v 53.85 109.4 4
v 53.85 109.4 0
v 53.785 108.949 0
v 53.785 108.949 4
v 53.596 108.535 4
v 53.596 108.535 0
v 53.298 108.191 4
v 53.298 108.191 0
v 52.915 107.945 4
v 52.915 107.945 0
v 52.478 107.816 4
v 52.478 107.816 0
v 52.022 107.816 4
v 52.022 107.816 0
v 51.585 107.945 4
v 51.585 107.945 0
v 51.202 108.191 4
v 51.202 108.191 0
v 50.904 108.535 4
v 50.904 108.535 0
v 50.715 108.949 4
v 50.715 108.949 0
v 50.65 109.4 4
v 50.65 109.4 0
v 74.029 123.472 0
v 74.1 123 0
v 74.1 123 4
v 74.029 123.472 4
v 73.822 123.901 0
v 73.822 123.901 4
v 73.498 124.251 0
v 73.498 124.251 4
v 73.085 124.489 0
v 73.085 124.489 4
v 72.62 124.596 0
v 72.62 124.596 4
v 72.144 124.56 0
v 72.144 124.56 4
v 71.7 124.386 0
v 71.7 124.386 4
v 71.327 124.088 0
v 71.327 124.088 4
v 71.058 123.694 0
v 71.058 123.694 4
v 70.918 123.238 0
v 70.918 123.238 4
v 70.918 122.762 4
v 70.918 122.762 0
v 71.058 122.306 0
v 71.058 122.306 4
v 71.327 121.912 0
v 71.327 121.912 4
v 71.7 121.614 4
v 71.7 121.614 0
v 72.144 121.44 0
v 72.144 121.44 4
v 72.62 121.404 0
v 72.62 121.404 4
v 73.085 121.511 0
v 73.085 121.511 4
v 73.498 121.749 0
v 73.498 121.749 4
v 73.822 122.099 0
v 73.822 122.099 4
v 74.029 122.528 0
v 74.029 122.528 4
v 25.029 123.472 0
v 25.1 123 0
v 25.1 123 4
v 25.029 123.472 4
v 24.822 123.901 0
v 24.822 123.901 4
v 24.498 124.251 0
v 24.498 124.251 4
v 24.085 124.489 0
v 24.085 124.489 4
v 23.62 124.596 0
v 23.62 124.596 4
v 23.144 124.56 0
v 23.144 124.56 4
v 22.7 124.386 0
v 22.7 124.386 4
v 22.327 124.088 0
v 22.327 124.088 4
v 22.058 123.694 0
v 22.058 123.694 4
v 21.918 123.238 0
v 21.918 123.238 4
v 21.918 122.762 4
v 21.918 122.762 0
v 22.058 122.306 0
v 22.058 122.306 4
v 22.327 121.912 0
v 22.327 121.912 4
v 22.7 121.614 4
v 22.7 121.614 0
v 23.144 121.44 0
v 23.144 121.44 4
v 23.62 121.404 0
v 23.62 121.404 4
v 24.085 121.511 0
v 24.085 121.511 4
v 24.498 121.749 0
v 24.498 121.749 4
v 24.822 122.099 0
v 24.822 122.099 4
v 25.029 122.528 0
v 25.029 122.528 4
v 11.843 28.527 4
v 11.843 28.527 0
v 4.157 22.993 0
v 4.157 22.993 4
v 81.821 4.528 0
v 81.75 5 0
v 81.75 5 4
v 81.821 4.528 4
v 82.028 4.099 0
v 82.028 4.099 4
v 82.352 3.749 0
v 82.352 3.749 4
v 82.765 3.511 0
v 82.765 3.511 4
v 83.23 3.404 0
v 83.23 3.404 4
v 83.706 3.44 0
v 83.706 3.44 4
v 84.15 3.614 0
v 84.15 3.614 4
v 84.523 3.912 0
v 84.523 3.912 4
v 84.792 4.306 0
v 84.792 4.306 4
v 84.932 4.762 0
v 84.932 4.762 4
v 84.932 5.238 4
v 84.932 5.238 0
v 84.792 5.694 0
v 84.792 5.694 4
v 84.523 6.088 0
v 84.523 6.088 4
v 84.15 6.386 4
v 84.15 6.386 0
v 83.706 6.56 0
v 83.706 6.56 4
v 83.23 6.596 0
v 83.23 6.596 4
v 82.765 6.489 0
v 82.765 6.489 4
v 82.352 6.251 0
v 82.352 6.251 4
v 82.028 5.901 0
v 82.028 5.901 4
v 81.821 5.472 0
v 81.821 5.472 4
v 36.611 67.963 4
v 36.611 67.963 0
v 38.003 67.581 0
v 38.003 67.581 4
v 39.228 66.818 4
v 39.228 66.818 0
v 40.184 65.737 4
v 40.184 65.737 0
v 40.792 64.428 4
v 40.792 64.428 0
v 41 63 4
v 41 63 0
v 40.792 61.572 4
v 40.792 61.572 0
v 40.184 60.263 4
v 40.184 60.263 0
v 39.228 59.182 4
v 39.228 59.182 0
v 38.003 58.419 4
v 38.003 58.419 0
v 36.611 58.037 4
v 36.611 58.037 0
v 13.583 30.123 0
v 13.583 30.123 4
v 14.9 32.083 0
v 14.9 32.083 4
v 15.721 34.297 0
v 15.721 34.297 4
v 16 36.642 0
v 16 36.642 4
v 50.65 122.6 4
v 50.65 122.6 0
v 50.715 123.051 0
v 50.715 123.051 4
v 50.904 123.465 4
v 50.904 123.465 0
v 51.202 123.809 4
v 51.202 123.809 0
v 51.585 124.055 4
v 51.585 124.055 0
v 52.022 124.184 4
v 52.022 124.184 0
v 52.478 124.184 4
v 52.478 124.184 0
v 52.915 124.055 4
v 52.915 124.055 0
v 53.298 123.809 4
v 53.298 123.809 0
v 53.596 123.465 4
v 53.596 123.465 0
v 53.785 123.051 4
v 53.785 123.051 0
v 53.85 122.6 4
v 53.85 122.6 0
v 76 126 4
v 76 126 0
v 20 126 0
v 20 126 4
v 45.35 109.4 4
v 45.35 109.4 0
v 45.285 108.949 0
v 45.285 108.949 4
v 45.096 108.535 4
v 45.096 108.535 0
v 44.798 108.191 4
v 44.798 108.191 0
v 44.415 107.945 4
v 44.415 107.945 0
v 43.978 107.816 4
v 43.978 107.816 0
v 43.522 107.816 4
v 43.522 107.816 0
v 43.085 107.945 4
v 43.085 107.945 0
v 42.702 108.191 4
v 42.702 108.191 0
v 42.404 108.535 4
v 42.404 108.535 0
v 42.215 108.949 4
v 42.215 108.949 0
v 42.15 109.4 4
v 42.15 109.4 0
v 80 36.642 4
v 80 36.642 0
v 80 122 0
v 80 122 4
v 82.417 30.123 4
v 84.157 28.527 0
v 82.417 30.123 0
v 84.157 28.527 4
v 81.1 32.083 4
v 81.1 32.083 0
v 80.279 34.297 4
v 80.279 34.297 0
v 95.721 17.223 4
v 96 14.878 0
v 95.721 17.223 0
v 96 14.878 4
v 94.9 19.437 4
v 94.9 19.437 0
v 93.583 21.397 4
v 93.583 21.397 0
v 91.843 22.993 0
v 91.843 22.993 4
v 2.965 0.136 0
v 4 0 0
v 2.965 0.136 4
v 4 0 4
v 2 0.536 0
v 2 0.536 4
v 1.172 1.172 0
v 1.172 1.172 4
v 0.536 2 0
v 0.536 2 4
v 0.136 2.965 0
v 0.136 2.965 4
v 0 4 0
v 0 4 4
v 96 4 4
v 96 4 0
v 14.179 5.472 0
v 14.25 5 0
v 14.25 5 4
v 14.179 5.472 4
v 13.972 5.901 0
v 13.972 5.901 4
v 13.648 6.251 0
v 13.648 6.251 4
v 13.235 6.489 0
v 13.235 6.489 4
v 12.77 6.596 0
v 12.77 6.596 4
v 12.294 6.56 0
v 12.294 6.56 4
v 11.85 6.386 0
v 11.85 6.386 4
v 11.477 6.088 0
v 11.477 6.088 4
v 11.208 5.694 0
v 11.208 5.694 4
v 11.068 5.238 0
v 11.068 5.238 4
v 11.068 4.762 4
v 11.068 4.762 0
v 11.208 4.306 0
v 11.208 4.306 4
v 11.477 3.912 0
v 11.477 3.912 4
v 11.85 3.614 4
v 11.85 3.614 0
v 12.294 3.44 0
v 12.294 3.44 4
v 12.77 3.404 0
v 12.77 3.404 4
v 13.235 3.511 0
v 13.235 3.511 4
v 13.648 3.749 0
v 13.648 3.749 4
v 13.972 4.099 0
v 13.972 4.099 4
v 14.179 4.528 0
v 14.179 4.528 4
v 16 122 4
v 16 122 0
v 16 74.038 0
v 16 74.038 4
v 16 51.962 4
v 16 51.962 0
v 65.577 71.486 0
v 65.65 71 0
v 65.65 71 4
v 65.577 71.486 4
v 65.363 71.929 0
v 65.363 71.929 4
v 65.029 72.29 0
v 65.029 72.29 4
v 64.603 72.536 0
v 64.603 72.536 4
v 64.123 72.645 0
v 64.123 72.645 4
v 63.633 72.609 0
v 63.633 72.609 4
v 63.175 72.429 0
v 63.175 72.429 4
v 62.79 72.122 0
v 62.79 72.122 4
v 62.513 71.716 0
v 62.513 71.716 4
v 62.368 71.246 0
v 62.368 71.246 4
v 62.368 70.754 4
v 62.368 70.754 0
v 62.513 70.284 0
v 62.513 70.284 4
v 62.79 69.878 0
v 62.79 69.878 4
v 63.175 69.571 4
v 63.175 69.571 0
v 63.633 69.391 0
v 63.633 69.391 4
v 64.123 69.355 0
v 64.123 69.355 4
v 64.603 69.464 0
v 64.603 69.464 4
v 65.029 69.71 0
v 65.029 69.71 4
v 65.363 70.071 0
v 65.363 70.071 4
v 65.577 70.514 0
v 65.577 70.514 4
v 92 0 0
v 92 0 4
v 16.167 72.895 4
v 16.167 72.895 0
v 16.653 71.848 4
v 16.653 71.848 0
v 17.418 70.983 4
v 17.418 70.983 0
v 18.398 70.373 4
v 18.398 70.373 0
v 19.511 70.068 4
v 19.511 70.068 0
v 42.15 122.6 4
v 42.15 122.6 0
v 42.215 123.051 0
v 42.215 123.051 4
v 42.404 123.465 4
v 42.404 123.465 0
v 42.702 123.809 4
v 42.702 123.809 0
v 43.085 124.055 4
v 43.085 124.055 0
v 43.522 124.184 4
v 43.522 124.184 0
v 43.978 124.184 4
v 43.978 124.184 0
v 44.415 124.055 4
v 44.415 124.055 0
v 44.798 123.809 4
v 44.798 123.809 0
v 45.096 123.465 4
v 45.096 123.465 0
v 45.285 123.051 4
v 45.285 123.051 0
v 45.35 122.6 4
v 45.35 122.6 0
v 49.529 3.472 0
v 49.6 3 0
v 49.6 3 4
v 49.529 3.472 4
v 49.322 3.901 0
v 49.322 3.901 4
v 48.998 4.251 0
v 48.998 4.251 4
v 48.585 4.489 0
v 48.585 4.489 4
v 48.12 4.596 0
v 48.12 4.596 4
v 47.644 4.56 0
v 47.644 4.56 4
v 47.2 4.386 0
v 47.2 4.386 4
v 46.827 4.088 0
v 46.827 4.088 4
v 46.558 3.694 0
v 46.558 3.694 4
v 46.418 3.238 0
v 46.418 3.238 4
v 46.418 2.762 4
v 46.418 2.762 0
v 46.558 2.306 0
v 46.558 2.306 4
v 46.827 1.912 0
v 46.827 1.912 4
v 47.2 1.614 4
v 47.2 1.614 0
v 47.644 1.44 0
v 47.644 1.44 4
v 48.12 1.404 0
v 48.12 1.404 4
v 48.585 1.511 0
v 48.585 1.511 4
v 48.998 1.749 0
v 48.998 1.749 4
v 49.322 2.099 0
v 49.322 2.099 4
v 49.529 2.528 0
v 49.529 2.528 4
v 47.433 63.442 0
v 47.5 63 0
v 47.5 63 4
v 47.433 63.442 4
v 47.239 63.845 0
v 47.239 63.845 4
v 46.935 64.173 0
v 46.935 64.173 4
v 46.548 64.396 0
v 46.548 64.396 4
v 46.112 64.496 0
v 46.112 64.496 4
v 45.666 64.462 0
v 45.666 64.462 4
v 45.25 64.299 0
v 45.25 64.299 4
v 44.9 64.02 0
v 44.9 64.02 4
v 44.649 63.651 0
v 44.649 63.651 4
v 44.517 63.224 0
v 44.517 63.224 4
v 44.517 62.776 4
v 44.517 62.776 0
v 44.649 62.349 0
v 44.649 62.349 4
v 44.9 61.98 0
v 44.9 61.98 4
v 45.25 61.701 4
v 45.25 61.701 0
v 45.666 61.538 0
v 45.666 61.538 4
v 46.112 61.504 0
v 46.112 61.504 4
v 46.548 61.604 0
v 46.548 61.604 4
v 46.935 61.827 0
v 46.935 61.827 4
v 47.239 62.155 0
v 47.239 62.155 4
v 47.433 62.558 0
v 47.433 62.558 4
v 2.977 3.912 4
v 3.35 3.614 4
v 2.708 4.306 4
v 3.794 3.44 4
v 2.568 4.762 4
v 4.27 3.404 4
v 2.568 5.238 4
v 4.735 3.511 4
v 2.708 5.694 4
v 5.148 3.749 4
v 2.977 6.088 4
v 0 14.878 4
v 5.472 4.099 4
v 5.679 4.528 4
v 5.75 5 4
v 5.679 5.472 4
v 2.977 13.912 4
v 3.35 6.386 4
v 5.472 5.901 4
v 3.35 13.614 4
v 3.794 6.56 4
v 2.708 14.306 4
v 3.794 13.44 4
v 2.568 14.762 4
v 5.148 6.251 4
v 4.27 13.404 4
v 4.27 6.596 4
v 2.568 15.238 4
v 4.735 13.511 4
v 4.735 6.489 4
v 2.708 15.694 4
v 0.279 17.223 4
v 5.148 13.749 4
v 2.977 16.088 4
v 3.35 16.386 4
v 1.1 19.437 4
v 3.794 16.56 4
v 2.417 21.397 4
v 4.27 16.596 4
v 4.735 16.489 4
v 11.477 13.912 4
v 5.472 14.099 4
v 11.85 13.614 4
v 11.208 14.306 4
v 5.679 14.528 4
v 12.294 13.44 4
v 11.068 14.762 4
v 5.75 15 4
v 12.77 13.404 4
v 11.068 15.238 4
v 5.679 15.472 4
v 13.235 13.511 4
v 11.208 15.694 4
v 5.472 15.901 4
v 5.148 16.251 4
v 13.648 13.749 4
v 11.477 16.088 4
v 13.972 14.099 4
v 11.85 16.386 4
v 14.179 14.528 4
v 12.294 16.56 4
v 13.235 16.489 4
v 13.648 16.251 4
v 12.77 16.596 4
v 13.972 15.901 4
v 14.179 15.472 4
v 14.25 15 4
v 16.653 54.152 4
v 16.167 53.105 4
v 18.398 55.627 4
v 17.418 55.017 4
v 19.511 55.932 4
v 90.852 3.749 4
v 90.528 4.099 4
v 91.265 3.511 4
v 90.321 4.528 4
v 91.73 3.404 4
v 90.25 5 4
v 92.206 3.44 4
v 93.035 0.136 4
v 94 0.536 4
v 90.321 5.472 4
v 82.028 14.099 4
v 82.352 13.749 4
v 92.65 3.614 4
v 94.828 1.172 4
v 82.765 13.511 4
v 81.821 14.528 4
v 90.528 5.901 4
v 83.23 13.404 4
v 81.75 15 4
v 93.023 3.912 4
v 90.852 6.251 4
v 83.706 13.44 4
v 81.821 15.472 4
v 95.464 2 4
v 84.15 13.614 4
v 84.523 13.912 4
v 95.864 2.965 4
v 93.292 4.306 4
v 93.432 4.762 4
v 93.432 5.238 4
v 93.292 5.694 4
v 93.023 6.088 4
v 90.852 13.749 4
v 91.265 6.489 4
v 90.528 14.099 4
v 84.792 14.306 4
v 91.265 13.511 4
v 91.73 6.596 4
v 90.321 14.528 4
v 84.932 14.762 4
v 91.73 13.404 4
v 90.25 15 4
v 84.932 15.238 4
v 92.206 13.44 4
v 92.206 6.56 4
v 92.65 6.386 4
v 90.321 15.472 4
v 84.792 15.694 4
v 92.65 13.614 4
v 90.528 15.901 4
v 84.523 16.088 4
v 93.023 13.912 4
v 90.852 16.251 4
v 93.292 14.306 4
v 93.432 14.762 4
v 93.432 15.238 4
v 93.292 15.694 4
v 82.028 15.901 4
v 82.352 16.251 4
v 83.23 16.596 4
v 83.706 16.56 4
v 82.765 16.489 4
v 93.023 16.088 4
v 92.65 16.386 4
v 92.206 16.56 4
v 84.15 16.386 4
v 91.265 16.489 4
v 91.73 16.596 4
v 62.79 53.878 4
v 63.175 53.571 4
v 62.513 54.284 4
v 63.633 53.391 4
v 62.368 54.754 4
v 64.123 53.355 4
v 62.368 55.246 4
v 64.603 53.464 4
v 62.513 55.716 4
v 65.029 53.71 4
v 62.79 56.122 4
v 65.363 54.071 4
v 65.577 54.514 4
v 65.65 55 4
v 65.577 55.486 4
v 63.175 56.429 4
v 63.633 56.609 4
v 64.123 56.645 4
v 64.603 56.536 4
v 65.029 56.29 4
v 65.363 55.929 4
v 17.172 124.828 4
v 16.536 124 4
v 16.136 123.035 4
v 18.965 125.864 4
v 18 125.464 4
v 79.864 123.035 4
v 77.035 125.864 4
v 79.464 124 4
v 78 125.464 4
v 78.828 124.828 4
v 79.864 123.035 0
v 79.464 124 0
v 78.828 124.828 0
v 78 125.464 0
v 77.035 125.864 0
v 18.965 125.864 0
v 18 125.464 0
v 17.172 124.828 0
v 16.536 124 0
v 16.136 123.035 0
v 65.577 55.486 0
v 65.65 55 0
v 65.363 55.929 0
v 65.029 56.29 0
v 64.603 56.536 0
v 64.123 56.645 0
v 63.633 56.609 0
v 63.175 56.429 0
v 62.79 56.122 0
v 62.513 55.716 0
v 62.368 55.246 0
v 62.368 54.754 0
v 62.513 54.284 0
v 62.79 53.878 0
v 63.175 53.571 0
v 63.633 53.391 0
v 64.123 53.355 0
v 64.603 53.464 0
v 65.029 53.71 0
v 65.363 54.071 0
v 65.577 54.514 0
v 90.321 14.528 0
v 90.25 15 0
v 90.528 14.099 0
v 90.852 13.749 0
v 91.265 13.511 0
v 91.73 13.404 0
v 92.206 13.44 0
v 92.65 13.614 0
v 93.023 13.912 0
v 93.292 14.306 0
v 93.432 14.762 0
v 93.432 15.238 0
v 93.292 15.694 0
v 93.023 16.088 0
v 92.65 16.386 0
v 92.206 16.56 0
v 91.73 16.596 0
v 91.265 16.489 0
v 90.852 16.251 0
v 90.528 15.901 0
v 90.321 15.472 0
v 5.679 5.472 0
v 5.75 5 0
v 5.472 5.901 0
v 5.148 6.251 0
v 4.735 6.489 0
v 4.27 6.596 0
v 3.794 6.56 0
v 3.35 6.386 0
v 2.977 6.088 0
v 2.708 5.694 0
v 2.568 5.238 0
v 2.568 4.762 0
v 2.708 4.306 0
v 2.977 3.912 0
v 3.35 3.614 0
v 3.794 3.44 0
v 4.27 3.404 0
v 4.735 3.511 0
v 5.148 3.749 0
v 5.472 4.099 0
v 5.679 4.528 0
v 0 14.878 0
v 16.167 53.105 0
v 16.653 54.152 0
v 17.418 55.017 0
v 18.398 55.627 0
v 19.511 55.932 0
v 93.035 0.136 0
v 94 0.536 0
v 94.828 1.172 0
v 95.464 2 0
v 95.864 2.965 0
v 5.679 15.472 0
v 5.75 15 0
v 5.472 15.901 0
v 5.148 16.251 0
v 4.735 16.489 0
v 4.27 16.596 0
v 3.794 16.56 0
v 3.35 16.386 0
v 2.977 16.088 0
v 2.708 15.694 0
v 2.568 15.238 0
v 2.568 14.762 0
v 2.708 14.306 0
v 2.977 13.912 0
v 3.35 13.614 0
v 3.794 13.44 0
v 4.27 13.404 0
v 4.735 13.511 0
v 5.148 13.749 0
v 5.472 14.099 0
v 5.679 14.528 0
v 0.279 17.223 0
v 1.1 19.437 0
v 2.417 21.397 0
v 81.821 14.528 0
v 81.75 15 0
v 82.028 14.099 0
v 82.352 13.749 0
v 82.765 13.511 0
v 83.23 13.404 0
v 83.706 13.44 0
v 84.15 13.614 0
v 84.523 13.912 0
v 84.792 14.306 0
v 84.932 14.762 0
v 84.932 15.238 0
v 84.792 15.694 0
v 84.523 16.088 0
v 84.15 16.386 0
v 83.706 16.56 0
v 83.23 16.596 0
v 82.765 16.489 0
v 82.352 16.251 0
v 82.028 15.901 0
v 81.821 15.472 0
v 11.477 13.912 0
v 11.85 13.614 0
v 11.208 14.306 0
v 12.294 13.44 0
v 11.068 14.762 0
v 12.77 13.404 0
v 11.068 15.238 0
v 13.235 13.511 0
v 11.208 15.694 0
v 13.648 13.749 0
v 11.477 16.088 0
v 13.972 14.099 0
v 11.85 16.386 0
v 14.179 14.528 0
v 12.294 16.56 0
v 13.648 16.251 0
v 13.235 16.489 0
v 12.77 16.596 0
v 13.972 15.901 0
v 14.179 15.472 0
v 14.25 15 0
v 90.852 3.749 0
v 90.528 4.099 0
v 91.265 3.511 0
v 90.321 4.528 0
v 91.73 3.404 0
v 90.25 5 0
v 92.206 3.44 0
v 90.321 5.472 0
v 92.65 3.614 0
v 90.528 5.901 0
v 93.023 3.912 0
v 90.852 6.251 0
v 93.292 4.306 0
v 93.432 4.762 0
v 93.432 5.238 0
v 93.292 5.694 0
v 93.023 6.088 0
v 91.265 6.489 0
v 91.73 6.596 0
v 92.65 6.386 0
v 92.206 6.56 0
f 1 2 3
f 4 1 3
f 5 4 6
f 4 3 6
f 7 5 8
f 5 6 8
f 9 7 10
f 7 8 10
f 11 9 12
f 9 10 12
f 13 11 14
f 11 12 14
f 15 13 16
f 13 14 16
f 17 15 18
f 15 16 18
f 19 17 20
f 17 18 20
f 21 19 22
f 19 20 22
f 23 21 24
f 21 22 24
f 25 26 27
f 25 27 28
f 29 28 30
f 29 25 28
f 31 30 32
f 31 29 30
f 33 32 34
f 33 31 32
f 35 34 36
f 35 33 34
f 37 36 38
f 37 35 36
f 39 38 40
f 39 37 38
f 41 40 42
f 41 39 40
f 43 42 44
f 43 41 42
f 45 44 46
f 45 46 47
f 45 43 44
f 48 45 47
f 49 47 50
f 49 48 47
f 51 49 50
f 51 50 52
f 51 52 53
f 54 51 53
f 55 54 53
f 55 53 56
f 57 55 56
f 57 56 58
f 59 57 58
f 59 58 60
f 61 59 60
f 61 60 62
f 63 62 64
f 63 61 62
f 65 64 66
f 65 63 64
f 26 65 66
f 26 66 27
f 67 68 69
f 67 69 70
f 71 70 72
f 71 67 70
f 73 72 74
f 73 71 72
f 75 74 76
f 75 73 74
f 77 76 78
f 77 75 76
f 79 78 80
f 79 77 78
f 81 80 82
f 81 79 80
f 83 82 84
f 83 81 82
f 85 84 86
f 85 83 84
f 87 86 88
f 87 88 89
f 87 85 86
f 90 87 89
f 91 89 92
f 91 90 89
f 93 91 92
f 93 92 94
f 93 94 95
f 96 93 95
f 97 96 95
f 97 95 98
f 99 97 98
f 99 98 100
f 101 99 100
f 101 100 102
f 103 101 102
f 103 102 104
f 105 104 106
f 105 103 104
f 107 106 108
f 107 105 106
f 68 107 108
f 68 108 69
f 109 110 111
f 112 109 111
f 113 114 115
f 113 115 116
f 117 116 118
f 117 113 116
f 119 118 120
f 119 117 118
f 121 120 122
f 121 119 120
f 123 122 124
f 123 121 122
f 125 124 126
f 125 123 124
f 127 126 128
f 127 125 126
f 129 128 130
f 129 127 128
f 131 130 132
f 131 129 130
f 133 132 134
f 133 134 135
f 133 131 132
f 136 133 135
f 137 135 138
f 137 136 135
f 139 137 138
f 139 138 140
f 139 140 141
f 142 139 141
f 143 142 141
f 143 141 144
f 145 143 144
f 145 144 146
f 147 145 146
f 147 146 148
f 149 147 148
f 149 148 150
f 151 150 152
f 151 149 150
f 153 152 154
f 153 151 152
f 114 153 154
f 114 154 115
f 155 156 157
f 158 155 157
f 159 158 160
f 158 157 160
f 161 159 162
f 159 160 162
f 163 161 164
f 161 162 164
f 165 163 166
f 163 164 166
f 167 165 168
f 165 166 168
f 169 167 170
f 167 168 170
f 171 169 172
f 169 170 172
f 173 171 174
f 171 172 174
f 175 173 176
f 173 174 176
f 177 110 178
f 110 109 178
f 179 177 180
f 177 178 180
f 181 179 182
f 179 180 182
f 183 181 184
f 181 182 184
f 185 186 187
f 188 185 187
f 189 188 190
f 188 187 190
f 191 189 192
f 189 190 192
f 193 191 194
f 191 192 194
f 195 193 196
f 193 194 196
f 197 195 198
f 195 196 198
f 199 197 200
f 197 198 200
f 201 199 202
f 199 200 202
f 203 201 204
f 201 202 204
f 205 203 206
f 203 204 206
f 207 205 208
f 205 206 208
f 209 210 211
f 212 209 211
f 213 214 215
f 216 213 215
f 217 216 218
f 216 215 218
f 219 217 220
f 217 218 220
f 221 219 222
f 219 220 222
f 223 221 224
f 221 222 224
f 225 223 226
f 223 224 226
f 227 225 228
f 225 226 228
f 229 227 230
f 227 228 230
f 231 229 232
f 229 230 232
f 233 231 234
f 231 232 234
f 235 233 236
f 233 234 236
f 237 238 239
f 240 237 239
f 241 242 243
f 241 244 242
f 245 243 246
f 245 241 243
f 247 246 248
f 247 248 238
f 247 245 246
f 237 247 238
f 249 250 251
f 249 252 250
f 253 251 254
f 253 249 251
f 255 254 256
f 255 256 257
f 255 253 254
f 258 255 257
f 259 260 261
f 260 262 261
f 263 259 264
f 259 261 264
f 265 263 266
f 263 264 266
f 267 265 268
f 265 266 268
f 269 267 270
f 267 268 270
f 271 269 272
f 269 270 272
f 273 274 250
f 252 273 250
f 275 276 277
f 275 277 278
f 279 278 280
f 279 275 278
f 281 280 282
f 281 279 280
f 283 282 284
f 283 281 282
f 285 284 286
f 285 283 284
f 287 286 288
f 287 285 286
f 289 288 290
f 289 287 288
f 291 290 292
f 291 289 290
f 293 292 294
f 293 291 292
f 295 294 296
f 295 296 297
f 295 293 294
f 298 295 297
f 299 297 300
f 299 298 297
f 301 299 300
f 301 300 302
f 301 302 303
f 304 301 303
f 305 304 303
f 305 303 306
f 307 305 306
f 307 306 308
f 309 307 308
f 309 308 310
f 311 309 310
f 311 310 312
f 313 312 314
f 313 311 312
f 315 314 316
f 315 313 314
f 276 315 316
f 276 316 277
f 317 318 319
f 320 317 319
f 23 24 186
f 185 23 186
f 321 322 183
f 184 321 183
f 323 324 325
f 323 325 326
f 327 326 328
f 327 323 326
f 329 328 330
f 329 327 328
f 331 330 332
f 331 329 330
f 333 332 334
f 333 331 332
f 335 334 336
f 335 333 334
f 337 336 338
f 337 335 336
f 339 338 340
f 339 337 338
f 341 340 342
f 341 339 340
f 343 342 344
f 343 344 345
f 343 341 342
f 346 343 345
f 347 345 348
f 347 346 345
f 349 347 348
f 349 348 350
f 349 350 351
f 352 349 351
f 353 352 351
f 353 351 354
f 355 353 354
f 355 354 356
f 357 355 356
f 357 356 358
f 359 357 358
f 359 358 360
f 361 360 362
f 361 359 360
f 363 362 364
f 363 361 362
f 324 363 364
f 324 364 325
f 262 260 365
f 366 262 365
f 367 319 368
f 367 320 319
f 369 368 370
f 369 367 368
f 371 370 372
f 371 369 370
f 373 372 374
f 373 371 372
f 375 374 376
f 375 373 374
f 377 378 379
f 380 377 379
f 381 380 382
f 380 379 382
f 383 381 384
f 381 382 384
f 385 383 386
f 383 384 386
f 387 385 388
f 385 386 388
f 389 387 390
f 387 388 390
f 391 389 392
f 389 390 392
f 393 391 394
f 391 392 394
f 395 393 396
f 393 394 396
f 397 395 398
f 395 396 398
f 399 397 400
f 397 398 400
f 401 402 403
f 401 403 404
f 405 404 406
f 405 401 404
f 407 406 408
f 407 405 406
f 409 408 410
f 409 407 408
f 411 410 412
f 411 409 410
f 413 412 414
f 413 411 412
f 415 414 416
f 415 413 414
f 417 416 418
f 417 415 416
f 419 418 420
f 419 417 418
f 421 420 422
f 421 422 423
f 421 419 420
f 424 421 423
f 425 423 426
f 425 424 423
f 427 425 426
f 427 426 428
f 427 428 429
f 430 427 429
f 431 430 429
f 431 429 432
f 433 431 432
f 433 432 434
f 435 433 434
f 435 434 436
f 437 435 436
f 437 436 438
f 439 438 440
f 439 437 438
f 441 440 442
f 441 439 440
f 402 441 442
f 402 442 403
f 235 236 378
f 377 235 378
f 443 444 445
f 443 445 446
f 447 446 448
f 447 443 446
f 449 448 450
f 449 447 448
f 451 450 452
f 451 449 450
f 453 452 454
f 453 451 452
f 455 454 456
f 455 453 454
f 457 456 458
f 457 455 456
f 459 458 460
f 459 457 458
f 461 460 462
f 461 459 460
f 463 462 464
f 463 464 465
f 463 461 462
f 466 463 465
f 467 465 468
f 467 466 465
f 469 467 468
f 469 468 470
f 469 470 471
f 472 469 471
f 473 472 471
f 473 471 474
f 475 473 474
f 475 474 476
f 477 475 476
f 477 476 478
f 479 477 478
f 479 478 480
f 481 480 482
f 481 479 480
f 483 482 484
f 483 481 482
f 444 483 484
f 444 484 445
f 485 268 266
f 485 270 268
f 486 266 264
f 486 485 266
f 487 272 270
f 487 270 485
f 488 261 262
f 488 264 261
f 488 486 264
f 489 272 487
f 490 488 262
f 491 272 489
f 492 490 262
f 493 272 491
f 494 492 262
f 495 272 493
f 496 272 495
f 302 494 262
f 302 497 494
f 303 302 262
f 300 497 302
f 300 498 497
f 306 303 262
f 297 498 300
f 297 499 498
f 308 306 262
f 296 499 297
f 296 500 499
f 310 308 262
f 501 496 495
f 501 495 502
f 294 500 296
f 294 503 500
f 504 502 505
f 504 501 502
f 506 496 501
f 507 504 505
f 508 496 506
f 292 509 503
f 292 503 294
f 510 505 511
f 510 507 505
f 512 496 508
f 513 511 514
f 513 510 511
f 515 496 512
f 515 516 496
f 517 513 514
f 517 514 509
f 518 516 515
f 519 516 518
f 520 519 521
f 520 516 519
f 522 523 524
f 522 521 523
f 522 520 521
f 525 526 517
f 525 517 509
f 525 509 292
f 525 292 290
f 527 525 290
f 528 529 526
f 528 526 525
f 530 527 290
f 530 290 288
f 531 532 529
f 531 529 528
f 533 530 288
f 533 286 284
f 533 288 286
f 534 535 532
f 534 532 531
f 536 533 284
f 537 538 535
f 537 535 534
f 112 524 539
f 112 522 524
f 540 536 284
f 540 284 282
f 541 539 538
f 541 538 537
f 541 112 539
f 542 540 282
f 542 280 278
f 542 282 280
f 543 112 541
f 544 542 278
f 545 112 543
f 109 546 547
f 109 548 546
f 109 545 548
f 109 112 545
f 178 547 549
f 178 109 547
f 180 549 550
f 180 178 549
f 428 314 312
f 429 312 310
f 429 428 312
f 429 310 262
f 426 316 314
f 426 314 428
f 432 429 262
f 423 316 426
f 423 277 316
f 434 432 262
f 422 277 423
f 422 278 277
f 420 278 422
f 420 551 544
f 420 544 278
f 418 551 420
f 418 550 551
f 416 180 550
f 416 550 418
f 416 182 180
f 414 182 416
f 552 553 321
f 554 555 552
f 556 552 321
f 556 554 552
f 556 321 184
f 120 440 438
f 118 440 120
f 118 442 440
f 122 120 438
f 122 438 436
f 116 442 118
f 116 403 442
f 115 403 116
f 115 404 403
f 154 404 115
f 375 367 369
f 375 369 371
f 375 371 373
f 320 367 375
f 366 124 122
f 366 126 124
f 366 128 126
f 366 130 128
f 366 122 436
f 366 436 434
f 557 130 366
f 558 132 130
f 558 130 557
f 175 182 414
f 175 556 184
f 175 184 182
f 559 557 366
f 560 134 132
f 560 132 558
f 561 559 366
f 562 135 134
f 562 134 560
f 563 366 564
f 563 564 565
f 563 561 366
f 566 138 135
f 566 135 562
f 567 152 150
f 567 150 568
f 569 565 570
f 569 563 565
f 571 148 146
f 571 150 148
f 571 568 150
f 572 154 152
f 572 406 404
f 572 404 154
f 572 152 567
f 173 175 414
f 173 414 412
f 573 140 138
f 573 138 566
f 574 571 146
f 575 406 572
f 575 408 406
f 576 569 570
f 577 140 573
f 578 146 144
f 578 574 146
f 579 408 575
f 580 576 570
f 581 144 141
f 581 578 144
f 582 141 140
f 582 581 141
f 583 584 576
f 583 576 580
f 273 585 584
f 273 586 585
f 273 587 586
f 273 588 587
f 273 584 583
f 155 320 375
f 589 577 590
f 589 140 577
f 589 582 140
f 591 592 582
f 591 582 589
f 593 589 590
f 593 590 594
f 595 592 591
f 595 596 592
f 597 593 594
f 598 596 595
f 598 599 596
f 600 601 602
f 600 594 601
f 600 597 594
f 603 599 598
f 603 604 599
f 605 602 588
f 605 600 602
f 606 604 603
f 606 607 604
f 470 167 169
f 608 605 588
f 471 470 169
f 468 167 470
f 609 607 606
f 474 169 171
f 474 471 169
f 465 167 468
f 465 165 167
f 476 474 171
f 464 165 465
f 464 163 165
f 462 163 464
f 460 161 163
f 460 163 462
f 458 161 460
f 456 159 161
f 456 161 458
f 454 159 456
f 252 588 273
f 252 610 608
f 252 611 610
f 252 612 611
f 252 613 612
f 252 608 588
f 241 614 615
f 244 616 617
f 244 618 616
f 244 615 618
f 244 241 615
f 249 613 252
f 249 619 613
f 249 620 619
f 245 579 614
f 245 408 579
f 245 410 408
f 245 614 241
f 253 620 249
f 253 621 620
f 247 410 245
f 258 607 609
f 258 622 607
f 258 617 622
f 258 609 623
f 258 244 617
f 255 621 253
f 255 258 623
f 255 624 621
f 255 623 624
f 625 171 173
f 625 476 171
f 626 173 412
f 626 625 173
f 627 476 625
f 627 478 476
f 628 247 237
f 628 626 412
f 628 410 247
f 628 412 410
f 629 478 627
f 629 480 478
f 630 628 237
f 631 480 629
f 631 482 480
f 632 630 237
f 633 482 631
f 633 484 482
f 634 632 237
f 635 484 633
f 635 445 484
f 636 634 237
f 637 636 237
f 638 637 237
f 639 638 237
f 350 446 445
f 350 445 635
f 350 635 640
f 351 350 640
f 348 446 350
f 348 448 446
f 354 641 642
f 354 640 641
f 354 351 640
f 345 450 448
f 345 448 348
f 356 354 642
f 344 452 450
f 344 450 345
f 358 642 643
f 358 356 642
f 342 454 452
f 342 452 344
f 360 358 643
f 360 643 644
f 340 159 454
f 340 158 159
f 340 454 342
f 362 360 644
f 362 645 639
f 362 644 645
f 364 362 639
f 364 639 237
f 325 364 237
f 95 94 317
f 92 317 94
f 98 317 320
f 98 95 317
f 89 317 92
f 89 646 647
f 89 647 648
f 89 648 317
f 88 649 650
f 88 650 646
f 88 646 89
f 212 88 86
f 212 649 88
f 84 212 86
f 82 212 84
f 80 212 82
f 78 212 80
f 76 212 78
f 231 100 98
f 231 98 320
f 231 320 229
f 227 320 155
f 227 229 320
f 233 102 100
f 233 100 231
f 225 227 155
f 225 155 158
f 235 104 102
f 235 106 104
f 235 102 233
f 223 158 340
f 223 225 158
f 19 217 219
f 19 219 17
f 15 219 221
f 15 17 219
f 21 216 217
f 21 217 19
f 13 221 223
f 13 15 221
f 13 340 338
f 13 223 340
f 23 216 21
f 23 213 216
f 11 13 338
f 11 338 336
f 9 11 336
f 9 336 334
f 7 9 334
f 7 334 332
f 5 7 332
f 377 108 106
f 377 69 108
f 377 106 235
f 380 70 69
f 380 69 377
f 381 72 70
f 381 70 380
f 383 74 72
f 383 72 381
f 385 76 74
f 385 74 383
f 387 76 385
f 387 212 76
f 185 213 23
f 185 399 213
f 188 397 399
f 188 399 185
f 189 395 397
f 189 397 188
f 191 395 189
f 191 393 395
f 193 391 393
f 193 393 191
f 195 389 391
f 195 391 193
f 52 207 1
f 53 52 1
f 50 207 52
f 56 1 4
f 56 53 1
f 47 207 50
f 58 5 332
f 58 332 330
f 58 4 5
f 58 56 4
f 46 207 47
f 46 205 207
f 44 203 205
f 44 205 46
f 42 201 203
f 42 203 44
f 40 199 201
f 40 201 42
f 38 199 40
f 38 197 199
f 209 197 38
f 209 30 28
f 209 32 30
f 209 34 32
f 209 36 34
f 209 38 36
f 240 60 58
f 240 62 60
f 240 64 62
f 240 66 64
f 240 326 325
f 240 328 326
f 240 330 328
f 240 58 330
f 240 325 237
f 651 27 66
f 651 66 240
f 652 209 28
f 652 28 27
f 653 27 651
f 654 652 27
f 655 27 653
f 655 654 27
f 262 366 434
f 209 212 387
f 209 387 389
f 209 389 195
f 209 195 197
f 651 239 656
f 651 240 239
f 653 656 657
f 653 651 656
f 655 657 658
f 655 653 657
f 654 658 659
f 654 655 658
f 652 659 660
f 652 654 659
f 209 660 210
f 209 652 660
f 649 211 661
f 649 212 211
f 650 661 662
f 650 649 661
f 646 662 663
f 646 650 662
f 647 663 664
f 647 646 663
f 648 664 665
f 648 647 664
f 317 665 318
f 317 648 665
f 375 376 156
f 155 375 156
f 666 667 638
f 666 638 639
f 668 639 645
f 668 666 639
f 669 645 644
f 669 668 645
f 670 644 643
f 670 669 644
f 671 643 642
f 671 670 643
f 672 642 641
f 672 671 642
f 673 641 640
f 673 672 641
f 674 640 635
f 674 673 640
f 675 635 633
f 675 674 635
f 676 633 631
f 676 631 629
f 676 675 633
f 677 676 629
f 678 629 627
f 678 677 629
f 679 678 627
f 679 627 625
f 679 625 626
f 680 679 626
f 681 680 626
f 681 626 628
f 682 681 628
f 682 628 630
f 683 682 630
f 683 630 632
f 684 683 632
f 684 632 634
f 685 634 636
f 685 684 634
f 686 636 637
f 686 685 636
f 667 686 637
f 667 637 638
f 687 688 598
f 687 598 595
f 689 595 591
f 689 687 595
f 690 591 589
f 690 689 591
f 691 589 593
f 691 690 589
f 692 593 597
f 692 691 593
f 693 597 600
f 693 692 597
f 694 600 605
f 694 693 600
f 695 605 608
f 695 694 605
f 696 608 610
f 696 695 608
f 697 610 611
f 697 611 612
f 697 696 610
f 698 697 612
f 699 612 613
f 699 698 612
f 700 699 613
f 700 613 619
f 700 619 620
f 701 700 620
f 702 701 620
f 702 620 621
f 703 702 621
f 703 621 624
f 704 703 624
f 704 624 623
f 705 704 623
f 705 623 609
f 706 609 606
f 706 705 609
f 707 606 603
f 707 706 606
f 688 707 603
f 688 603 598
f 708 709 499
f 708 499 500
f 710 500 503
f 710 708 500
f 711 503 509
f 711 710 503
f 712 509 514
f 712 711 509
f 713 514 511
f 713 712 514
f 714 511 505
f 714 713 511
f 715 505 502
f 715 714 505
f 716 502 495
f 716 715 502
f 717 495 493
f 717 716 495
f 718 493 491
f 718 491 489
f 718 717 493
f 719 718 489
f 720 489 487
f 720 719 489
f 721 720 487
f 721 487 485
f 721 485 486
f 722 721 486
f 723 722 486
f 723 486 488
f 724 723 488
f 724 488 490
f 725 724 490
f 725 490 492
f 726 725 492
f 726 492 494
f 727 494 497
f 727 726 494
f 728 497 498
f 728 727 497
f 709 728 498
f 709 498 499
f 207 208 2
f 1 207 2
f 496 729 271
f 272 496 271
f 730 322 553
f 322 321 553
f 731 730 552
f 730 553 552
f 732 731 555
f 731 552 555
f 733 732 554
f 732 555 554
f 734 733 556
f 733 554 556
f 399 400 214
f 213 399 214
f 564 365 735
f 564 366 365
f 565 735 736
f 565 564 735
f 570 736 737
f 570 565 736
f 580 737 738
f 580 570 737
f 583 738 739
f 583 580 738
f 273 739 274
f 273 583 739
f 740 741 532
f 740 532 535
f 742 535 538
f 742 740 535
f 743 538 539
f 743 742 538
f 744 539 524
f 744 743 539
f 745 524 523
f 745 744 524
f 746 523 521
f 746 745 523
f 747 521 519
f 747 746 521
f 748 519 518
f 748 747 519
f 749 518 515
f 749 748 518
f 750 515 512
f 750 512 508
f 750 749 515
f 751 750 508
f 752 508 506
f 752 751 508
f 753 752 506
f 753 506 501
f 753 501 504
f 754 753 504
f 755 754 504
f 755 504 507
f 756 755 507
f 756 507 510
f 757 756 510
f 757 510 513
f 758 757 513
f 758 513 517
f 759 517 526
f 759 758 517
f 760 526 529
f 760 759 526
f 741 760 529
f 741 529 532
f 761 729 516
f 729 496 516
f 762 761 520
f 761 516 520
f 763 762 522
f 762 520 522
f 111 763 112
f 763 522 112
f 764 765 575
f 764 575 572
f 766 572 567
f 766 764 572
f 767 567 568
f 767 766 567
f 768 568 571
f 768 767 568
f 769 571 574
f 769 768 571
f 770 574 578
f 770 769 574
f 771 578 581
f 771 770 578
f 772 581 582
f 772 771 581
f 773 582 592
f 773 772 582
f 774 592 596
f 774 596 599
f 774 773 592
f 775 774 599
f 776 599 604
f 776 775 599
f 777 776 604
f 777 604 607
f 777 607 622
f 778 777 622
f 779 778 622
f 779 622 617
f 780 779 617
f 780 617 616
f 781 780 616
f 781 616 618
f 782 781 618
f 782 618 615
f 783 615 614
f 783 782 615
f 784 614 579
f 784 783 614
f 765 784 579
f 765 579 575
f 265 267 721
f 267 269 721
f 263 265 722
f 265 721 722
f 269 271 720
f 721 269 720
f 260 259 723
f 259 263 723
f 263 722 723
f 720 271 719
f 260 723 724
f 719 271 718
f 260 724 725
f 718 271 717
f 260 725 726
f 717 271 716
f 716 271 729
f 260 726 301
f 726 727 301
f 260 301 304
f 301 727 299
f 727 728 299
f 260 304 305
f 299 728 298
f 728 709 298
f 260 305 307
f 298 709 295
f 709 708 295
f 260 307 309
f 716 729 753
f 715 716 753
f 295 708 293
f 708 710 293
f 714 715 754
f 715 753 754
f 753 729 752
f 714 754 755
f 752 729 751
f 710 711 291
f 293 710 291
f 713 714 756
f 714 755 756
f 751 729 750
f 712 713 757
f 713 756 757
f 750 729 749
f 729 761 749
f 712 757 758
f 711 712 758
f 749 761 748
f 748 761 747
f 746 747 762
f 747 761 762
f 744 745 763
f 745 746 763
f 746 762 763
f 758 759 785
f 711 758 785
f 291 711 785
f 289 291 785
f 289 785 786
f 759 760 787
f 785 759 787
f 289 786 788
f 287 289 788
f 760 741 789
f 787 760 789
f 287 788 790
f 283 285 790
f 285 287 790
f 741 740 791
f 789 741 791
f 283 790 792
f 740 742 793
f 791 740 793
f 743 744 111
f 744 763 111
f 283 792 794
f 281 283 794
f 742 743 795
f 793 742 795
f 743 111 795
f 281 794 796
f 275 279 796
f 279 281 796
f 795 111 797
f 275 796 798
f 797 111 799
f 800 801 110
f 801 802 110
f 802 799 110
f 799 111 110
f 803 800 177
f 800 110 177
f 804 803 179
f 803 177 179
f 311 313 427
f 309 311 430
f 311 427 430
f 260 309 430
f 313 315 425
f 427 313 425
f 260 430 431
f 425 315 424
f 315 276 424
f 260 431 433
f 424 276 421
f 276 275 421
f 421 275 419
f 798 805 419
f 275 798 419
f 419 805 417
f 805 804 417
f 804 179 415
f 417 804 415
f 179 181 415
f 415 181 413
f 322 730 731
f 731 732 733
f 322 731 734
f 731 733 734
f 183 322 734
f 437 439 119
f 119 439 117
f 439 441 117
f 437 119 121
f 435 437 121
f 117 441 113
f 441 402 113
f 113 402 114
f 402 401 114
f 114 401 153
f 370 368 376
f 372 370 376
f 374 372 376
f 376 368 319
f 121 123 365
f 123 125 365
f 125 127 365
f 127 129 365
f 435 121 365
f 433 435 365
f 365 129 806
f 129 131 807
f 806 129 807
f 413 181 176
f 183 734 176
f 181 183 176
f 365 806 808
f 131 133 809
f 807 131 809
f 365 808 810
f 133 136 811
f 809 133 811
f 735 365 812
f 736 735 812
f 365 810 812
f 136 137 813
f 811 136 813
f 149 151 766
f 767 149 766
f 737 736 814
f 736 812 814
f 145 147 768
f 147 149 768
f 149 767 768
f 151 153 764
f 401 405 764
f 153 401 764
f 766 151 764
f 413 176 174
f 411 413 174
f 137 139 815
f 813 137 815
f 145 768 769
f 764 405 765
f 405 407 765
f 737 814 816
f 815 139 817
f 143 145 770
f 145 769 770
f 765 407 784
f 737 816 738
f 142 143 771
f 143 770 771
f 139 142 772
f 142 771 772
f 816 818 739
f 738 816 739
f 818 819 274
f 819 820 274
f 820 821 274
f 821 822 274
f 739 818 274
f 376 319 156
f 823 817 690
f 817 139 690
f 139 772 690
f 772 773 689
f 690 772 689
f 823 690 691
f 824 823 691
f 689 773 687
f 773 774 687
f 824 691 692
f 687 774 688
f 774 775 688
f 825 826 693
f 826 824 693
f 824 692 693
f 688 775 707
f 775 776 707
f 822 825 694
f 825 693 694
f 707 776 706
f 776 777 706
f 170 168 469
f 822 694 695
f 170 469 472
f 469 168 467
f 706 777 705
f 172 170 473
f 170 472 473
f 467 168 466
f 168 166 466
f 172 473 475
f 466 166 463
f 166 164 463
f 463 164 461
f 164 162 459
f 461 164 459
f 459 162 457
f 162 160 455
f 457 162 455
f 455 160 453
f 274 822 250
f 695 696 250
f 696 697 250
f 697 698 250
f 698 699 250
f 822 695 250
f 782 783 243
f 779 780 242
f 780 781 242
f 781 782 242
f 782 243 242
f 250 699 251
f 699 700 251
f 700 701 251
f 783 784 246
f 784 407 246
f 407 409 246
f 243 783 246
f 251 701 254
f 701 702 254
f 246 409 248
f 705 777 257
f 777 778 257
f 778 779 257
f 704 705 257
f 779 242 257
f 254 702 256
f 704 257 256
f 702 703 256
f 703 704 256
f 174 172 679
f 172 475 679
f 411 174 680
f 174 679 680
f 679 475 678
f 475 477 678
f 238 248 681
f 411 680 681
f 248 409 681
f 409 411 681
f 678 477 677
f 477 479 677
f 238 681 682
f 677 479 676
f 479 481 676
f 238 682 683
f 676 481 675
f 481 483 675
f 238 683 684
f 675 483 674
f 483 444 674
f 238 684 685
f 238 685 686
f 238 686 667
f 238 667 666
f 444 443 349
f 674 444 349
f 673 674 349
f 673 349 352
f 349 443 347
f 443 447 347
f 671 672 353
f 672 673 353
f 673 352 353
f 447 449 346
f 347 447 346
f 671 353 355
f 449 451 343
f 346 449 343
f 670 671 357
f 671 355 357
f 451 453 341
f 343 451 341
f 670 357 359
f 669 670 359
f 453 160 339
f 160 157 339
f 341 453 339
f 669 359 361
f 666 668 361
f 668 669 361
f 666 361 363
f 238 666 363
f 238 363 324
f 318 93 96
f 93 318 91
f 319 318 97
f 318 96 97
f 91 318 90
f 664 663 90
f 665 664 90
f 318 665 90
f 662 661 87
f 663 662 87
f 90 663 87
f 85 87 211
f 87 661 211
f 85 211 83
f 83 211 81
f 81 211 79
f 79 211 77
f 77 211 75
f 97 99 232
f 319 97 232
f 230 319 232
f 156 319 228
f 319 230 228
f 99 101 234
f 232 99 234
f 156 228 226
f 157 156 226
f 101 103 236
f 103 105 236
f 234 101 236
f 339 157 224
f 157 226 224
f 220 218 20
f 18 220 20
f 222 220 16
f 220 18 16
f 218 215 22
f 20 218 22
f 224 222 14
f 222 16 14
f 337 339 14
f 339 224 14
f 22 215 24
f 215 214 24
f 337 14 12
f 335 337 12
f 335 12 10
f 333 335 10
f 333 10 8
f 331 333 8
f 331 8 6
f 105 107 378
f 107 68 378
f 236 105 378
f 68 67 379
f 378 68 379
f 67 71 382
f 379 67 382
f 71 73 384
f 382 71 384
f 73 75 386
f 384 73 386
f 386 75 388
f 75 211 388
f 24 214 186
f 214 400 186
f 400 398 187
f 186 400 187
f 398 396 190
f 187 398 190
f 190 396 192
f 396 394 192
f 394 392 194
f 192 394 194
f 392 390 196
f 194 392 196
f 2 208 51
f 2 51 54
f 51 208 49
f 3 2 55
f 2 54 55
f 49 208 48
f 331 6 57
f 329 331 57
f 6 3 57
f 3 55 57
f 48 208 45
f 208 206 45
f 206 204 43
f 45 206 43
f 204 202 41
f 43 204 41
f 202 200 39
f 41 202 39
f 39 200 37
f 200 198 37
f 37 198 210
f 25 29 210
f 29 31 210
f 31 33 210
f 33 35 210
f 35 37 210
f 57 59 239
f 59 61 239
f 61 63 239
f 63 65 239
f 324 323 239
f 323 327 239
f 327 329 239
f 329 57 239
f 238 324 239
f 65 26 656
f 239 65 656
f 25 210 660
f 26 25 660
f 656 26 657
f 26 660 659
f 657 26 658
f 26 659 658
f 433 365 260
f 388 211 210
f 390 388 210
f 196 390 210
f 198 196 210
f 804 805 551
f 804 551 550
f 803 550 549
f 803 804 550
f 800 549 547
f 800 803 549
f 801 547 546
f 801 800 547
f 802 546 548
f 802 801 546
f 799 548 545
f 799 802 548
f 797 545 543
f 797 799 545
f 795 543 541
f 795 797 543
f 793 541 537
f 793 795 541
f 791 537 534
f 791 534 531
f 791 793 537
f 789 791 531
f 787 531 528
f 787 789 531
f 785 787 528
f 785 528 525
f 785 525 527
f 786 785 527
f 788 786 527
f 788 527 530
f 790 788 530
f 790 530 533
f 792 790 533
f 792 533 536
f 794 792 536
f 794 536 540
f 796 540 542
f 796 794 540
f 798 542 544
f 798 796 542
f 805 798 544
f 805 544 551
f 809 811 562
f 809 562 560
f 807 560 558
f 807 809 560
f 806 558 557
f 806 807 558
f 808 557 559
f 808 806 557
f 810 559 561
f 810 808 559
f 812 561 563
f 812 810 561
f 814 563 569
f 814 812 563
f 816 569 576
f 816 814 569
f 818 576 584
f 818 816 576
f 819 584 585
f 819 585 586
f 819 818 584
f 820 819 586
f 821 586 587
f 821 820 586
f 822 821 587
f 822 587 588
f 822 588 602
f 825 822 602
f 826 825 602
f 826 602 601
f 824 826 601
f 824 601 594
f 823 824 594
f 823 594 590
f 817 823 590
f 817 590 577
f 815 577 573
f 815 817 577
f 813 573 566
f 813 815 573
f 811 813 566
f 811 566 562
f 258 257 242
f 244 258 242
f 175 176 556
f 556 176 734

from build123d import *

# Parameters (mm, degrees)
SKETCH1_R           = 1.6
SKETCH1_R_2         = 1.65
SKETCH1_R_3         = 1.5
BOSS_EXTRUDE1_DEPTH = 4
FILLET1_R           = 4
FILLET2_R           = 10


with BuildPart() as part:
    # Sketch1 → Boss-Extrude1 (new body)
    with BuildSketch(Plane.XY):
        with BuildLine():
            Line((0, 0), (96, 0))
            Line((96, 0), (96, 20))
            Line((96, 20), (80, 31.52))
            Line((80, 31.52), (80, 126))
            Line((80, 126), (16, 126))
            Line((16, 126), (16, 70.5))
            Line((16, 70.5), (36.610950109, 67.962533624))
            ThreePointArc((36.610950109, 67.962533624), (41, 63), (36.610950109, 58.037466376))
            Line((36.610950109, 58.037466376), (16, 55.5))
            Line((16, 55.5), (16, 31.52))
            Line((16, 31.52), (0, 20))
            Line((0, 20), (0, 0))
        make_face()
        with Locations((4.15, 5)):
            Circle(SKETCH1_R, mode=Mode.SUBTRACT)
        with Locations((12.65, 5)):
            Circle(SKETCH1_R, mode=Mode.SUBTRACT)
        with Locations((12.65, 15)):
            Circle(SKETCH1_R, mode=Mode.SUBTRACT)
        with Locations((4.15, 15)):
            Circle(SKETCH1_R, mode=Mode.SUBTRACT)
        with Locations(Location((91.85, 5, 0), (0, 0, 180))):
            Circle(SKETCH1_R, mode=Mode.SUBTRACT)
        with Locations(Location((83.35, 5, 0), (0, 0, 180))):
            Circle(SKETCH1_R, mode=Mode.SUBTRACT)
        with Locations(Location((83.35, 15, 0), (0, 0, 180))):
            Circle(SKETCH1_R, mode=Mode.SUBTRACT)
        with Locations(Location((91.85, 15, 0), (0, 0, 180))):
            Circle(SKETCH1_R, mode=Mode.SUBTRACT)
        with Locations((48, 3)):
            Circle(SKETCH1_R, mode=Mode.SUBTRACT)
        with Locations((23.5, 123)):
            Circle(SKETCH1_R, mode=Mode.SUBTRACT)
        with Locations((72.5, 123)):
            Circle(SKETCH1_R, mode=Mode.SUBTRACT)
        with Locations((64, 71)):
            Circle(SKETCH1_R_2, mode=Mode.SUBTRACT)
        with Locations((64, 55)):
            Circle(SKETCH1_R_2, mode=Mode.SUBTRACT)
        with Locations((46, 63)):
            Circle(SKETCH1_R_3, mode=Mode.SUBTRACT)
        with BuildLine():
            Line((45.35, 122.6), (45.35, 109.4))
            ThreePointArc((45.35, 109.4), (43.75, 107.8), (42.15, 109.4))
            Line((42.15, 109.4), (42.15, 122.6))
            ThreePointArc((42.15, 122.6), (43.75, 124.2), (45.35, 122.6))
        make_face(mode=Mode.SUBTRACT)
        with BuildLine():
            Line((50.65, 109.4), (50.65, 122.6))
            ThreePointArc((50.65, 122.6), (52.25, 124.2), (53.85, 122.6))
            Line((53.85, 122.6), (53.85, 109.4))
            ThreePointArc((53.85, 109.4), (52.25, 107.8), (50.65, 109.4))
        make_face(mode=Mode.SUBTRACT)
    extrude(amount=BOSS_EXTRUDE1_DEPTH)

    # Fillet1
    fillet1_edges = [part.edges().sort_by_distance(p)[0] for p in [
        (16, 55.5, 2),
        (16, 70.5, 2),
        (16, 126, 2),
        (80, 126, 2),
        (96, 0, 2),
        (0, 0, 2),
    ]]
    fillet(fillet1_edges, radius=FILLET1_R)

    # Fillet2
    fillet2_edges = [part.edges().sort_by_distance(p)[0] for p in [
        (0, 20, 2),
        (16, 31.52, 2),
        (80, 31.52, 2),
        (96, 20, 2),
    ]]
    fillet(fillet2_edges, radius=FILLET2_R)


solid = part.part
